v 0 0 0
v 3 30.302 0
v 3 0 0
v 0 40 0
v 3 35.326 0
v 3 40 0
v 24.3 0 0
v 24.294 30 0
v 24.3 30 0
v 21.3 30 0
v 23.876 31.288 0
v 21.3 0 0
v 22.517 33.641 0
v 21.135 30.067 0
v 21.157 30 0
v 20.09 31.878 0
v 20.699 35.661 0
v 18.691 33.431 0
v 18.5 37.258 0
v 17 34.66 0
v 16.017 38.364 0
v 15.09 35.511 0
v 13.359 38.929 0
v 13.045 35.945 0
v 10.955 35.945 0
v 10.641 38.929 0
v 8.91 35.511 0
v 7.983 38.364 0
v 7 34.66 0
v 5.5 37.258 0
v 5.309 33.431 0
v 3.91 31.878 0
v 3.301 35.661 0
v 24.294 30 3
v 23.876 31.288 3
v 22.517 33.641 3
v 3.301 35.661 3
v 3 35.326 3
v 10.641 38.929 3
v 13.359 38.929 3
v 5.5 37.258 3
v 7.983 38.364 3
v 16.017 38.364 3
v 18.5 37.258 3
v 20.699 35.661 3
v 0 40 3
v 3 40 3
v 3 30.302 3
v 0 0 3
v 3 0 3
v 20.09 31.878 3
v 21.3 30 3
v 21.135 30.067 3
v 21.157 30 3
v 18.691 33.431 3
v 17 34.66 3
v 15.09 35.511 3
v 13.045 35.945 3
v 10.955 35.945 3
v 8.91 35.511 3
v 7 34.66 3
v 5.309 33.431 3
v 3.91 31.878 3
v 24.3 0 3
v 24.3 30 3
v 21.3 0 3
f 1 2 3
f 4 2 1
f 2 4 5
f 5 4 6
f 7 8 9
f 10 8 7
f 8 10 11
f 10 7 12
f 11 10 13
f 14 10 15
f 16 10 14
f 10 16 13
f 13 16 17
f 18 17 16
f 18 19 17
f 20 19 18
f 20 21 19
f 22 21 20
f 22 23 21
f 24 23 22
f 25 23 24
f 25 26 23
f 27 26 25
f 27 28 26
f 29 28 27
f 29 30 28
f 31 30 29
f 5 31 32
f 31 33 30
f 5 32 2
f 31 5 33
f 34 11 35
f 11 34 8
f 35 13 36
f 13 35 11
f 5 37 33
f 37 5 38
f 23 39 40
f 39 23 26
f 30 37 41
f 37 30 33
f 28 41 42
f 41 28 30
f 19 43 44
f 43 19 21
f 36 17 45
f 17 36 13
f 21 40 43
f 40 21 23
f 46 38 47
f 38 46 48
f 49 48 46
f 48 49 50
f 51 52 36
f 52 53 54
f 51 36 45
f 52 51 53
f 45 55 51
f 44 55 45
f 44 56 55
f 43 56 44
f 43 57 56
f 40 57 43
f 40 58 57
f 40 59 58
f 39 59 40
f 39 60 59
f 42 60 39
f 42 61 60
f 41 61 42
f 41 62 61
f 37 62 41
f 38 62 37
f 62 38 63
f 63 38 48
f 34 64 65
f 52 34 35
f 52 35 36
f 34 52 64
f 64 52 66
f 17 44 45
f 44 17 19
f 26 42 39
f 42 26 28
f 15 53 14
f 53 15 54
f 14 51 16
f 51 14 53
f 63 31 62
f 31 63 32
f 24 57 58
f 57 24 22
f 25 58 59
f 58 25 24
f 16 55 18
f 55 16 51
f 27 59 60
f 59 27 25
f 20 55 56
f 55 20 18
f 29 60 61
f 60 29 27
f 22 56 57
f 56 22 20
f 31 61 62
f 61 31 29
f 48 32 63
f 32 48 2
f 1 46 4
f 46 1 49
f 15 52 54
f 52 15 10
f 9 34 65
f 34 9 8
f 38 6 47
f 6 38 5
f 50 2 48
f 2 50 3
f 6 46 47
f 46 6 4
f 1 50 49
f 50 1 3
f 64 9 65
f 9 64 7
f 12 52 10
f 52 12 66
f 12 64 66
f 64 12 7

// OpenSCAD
//буква n
union(){
cube([3,40,3]);
difference(){  
  translate([12,26,0]) cylinder(3,13,13);
  translate([12,26,0]) cylinder(3,10,10);
  translate([0,10,0]) cube([30,20,3]);
  translate([-3,0,0]) cube([3,40,3]);

}
  translate([21.3,0,0]) cube([3,30,3]);
}
